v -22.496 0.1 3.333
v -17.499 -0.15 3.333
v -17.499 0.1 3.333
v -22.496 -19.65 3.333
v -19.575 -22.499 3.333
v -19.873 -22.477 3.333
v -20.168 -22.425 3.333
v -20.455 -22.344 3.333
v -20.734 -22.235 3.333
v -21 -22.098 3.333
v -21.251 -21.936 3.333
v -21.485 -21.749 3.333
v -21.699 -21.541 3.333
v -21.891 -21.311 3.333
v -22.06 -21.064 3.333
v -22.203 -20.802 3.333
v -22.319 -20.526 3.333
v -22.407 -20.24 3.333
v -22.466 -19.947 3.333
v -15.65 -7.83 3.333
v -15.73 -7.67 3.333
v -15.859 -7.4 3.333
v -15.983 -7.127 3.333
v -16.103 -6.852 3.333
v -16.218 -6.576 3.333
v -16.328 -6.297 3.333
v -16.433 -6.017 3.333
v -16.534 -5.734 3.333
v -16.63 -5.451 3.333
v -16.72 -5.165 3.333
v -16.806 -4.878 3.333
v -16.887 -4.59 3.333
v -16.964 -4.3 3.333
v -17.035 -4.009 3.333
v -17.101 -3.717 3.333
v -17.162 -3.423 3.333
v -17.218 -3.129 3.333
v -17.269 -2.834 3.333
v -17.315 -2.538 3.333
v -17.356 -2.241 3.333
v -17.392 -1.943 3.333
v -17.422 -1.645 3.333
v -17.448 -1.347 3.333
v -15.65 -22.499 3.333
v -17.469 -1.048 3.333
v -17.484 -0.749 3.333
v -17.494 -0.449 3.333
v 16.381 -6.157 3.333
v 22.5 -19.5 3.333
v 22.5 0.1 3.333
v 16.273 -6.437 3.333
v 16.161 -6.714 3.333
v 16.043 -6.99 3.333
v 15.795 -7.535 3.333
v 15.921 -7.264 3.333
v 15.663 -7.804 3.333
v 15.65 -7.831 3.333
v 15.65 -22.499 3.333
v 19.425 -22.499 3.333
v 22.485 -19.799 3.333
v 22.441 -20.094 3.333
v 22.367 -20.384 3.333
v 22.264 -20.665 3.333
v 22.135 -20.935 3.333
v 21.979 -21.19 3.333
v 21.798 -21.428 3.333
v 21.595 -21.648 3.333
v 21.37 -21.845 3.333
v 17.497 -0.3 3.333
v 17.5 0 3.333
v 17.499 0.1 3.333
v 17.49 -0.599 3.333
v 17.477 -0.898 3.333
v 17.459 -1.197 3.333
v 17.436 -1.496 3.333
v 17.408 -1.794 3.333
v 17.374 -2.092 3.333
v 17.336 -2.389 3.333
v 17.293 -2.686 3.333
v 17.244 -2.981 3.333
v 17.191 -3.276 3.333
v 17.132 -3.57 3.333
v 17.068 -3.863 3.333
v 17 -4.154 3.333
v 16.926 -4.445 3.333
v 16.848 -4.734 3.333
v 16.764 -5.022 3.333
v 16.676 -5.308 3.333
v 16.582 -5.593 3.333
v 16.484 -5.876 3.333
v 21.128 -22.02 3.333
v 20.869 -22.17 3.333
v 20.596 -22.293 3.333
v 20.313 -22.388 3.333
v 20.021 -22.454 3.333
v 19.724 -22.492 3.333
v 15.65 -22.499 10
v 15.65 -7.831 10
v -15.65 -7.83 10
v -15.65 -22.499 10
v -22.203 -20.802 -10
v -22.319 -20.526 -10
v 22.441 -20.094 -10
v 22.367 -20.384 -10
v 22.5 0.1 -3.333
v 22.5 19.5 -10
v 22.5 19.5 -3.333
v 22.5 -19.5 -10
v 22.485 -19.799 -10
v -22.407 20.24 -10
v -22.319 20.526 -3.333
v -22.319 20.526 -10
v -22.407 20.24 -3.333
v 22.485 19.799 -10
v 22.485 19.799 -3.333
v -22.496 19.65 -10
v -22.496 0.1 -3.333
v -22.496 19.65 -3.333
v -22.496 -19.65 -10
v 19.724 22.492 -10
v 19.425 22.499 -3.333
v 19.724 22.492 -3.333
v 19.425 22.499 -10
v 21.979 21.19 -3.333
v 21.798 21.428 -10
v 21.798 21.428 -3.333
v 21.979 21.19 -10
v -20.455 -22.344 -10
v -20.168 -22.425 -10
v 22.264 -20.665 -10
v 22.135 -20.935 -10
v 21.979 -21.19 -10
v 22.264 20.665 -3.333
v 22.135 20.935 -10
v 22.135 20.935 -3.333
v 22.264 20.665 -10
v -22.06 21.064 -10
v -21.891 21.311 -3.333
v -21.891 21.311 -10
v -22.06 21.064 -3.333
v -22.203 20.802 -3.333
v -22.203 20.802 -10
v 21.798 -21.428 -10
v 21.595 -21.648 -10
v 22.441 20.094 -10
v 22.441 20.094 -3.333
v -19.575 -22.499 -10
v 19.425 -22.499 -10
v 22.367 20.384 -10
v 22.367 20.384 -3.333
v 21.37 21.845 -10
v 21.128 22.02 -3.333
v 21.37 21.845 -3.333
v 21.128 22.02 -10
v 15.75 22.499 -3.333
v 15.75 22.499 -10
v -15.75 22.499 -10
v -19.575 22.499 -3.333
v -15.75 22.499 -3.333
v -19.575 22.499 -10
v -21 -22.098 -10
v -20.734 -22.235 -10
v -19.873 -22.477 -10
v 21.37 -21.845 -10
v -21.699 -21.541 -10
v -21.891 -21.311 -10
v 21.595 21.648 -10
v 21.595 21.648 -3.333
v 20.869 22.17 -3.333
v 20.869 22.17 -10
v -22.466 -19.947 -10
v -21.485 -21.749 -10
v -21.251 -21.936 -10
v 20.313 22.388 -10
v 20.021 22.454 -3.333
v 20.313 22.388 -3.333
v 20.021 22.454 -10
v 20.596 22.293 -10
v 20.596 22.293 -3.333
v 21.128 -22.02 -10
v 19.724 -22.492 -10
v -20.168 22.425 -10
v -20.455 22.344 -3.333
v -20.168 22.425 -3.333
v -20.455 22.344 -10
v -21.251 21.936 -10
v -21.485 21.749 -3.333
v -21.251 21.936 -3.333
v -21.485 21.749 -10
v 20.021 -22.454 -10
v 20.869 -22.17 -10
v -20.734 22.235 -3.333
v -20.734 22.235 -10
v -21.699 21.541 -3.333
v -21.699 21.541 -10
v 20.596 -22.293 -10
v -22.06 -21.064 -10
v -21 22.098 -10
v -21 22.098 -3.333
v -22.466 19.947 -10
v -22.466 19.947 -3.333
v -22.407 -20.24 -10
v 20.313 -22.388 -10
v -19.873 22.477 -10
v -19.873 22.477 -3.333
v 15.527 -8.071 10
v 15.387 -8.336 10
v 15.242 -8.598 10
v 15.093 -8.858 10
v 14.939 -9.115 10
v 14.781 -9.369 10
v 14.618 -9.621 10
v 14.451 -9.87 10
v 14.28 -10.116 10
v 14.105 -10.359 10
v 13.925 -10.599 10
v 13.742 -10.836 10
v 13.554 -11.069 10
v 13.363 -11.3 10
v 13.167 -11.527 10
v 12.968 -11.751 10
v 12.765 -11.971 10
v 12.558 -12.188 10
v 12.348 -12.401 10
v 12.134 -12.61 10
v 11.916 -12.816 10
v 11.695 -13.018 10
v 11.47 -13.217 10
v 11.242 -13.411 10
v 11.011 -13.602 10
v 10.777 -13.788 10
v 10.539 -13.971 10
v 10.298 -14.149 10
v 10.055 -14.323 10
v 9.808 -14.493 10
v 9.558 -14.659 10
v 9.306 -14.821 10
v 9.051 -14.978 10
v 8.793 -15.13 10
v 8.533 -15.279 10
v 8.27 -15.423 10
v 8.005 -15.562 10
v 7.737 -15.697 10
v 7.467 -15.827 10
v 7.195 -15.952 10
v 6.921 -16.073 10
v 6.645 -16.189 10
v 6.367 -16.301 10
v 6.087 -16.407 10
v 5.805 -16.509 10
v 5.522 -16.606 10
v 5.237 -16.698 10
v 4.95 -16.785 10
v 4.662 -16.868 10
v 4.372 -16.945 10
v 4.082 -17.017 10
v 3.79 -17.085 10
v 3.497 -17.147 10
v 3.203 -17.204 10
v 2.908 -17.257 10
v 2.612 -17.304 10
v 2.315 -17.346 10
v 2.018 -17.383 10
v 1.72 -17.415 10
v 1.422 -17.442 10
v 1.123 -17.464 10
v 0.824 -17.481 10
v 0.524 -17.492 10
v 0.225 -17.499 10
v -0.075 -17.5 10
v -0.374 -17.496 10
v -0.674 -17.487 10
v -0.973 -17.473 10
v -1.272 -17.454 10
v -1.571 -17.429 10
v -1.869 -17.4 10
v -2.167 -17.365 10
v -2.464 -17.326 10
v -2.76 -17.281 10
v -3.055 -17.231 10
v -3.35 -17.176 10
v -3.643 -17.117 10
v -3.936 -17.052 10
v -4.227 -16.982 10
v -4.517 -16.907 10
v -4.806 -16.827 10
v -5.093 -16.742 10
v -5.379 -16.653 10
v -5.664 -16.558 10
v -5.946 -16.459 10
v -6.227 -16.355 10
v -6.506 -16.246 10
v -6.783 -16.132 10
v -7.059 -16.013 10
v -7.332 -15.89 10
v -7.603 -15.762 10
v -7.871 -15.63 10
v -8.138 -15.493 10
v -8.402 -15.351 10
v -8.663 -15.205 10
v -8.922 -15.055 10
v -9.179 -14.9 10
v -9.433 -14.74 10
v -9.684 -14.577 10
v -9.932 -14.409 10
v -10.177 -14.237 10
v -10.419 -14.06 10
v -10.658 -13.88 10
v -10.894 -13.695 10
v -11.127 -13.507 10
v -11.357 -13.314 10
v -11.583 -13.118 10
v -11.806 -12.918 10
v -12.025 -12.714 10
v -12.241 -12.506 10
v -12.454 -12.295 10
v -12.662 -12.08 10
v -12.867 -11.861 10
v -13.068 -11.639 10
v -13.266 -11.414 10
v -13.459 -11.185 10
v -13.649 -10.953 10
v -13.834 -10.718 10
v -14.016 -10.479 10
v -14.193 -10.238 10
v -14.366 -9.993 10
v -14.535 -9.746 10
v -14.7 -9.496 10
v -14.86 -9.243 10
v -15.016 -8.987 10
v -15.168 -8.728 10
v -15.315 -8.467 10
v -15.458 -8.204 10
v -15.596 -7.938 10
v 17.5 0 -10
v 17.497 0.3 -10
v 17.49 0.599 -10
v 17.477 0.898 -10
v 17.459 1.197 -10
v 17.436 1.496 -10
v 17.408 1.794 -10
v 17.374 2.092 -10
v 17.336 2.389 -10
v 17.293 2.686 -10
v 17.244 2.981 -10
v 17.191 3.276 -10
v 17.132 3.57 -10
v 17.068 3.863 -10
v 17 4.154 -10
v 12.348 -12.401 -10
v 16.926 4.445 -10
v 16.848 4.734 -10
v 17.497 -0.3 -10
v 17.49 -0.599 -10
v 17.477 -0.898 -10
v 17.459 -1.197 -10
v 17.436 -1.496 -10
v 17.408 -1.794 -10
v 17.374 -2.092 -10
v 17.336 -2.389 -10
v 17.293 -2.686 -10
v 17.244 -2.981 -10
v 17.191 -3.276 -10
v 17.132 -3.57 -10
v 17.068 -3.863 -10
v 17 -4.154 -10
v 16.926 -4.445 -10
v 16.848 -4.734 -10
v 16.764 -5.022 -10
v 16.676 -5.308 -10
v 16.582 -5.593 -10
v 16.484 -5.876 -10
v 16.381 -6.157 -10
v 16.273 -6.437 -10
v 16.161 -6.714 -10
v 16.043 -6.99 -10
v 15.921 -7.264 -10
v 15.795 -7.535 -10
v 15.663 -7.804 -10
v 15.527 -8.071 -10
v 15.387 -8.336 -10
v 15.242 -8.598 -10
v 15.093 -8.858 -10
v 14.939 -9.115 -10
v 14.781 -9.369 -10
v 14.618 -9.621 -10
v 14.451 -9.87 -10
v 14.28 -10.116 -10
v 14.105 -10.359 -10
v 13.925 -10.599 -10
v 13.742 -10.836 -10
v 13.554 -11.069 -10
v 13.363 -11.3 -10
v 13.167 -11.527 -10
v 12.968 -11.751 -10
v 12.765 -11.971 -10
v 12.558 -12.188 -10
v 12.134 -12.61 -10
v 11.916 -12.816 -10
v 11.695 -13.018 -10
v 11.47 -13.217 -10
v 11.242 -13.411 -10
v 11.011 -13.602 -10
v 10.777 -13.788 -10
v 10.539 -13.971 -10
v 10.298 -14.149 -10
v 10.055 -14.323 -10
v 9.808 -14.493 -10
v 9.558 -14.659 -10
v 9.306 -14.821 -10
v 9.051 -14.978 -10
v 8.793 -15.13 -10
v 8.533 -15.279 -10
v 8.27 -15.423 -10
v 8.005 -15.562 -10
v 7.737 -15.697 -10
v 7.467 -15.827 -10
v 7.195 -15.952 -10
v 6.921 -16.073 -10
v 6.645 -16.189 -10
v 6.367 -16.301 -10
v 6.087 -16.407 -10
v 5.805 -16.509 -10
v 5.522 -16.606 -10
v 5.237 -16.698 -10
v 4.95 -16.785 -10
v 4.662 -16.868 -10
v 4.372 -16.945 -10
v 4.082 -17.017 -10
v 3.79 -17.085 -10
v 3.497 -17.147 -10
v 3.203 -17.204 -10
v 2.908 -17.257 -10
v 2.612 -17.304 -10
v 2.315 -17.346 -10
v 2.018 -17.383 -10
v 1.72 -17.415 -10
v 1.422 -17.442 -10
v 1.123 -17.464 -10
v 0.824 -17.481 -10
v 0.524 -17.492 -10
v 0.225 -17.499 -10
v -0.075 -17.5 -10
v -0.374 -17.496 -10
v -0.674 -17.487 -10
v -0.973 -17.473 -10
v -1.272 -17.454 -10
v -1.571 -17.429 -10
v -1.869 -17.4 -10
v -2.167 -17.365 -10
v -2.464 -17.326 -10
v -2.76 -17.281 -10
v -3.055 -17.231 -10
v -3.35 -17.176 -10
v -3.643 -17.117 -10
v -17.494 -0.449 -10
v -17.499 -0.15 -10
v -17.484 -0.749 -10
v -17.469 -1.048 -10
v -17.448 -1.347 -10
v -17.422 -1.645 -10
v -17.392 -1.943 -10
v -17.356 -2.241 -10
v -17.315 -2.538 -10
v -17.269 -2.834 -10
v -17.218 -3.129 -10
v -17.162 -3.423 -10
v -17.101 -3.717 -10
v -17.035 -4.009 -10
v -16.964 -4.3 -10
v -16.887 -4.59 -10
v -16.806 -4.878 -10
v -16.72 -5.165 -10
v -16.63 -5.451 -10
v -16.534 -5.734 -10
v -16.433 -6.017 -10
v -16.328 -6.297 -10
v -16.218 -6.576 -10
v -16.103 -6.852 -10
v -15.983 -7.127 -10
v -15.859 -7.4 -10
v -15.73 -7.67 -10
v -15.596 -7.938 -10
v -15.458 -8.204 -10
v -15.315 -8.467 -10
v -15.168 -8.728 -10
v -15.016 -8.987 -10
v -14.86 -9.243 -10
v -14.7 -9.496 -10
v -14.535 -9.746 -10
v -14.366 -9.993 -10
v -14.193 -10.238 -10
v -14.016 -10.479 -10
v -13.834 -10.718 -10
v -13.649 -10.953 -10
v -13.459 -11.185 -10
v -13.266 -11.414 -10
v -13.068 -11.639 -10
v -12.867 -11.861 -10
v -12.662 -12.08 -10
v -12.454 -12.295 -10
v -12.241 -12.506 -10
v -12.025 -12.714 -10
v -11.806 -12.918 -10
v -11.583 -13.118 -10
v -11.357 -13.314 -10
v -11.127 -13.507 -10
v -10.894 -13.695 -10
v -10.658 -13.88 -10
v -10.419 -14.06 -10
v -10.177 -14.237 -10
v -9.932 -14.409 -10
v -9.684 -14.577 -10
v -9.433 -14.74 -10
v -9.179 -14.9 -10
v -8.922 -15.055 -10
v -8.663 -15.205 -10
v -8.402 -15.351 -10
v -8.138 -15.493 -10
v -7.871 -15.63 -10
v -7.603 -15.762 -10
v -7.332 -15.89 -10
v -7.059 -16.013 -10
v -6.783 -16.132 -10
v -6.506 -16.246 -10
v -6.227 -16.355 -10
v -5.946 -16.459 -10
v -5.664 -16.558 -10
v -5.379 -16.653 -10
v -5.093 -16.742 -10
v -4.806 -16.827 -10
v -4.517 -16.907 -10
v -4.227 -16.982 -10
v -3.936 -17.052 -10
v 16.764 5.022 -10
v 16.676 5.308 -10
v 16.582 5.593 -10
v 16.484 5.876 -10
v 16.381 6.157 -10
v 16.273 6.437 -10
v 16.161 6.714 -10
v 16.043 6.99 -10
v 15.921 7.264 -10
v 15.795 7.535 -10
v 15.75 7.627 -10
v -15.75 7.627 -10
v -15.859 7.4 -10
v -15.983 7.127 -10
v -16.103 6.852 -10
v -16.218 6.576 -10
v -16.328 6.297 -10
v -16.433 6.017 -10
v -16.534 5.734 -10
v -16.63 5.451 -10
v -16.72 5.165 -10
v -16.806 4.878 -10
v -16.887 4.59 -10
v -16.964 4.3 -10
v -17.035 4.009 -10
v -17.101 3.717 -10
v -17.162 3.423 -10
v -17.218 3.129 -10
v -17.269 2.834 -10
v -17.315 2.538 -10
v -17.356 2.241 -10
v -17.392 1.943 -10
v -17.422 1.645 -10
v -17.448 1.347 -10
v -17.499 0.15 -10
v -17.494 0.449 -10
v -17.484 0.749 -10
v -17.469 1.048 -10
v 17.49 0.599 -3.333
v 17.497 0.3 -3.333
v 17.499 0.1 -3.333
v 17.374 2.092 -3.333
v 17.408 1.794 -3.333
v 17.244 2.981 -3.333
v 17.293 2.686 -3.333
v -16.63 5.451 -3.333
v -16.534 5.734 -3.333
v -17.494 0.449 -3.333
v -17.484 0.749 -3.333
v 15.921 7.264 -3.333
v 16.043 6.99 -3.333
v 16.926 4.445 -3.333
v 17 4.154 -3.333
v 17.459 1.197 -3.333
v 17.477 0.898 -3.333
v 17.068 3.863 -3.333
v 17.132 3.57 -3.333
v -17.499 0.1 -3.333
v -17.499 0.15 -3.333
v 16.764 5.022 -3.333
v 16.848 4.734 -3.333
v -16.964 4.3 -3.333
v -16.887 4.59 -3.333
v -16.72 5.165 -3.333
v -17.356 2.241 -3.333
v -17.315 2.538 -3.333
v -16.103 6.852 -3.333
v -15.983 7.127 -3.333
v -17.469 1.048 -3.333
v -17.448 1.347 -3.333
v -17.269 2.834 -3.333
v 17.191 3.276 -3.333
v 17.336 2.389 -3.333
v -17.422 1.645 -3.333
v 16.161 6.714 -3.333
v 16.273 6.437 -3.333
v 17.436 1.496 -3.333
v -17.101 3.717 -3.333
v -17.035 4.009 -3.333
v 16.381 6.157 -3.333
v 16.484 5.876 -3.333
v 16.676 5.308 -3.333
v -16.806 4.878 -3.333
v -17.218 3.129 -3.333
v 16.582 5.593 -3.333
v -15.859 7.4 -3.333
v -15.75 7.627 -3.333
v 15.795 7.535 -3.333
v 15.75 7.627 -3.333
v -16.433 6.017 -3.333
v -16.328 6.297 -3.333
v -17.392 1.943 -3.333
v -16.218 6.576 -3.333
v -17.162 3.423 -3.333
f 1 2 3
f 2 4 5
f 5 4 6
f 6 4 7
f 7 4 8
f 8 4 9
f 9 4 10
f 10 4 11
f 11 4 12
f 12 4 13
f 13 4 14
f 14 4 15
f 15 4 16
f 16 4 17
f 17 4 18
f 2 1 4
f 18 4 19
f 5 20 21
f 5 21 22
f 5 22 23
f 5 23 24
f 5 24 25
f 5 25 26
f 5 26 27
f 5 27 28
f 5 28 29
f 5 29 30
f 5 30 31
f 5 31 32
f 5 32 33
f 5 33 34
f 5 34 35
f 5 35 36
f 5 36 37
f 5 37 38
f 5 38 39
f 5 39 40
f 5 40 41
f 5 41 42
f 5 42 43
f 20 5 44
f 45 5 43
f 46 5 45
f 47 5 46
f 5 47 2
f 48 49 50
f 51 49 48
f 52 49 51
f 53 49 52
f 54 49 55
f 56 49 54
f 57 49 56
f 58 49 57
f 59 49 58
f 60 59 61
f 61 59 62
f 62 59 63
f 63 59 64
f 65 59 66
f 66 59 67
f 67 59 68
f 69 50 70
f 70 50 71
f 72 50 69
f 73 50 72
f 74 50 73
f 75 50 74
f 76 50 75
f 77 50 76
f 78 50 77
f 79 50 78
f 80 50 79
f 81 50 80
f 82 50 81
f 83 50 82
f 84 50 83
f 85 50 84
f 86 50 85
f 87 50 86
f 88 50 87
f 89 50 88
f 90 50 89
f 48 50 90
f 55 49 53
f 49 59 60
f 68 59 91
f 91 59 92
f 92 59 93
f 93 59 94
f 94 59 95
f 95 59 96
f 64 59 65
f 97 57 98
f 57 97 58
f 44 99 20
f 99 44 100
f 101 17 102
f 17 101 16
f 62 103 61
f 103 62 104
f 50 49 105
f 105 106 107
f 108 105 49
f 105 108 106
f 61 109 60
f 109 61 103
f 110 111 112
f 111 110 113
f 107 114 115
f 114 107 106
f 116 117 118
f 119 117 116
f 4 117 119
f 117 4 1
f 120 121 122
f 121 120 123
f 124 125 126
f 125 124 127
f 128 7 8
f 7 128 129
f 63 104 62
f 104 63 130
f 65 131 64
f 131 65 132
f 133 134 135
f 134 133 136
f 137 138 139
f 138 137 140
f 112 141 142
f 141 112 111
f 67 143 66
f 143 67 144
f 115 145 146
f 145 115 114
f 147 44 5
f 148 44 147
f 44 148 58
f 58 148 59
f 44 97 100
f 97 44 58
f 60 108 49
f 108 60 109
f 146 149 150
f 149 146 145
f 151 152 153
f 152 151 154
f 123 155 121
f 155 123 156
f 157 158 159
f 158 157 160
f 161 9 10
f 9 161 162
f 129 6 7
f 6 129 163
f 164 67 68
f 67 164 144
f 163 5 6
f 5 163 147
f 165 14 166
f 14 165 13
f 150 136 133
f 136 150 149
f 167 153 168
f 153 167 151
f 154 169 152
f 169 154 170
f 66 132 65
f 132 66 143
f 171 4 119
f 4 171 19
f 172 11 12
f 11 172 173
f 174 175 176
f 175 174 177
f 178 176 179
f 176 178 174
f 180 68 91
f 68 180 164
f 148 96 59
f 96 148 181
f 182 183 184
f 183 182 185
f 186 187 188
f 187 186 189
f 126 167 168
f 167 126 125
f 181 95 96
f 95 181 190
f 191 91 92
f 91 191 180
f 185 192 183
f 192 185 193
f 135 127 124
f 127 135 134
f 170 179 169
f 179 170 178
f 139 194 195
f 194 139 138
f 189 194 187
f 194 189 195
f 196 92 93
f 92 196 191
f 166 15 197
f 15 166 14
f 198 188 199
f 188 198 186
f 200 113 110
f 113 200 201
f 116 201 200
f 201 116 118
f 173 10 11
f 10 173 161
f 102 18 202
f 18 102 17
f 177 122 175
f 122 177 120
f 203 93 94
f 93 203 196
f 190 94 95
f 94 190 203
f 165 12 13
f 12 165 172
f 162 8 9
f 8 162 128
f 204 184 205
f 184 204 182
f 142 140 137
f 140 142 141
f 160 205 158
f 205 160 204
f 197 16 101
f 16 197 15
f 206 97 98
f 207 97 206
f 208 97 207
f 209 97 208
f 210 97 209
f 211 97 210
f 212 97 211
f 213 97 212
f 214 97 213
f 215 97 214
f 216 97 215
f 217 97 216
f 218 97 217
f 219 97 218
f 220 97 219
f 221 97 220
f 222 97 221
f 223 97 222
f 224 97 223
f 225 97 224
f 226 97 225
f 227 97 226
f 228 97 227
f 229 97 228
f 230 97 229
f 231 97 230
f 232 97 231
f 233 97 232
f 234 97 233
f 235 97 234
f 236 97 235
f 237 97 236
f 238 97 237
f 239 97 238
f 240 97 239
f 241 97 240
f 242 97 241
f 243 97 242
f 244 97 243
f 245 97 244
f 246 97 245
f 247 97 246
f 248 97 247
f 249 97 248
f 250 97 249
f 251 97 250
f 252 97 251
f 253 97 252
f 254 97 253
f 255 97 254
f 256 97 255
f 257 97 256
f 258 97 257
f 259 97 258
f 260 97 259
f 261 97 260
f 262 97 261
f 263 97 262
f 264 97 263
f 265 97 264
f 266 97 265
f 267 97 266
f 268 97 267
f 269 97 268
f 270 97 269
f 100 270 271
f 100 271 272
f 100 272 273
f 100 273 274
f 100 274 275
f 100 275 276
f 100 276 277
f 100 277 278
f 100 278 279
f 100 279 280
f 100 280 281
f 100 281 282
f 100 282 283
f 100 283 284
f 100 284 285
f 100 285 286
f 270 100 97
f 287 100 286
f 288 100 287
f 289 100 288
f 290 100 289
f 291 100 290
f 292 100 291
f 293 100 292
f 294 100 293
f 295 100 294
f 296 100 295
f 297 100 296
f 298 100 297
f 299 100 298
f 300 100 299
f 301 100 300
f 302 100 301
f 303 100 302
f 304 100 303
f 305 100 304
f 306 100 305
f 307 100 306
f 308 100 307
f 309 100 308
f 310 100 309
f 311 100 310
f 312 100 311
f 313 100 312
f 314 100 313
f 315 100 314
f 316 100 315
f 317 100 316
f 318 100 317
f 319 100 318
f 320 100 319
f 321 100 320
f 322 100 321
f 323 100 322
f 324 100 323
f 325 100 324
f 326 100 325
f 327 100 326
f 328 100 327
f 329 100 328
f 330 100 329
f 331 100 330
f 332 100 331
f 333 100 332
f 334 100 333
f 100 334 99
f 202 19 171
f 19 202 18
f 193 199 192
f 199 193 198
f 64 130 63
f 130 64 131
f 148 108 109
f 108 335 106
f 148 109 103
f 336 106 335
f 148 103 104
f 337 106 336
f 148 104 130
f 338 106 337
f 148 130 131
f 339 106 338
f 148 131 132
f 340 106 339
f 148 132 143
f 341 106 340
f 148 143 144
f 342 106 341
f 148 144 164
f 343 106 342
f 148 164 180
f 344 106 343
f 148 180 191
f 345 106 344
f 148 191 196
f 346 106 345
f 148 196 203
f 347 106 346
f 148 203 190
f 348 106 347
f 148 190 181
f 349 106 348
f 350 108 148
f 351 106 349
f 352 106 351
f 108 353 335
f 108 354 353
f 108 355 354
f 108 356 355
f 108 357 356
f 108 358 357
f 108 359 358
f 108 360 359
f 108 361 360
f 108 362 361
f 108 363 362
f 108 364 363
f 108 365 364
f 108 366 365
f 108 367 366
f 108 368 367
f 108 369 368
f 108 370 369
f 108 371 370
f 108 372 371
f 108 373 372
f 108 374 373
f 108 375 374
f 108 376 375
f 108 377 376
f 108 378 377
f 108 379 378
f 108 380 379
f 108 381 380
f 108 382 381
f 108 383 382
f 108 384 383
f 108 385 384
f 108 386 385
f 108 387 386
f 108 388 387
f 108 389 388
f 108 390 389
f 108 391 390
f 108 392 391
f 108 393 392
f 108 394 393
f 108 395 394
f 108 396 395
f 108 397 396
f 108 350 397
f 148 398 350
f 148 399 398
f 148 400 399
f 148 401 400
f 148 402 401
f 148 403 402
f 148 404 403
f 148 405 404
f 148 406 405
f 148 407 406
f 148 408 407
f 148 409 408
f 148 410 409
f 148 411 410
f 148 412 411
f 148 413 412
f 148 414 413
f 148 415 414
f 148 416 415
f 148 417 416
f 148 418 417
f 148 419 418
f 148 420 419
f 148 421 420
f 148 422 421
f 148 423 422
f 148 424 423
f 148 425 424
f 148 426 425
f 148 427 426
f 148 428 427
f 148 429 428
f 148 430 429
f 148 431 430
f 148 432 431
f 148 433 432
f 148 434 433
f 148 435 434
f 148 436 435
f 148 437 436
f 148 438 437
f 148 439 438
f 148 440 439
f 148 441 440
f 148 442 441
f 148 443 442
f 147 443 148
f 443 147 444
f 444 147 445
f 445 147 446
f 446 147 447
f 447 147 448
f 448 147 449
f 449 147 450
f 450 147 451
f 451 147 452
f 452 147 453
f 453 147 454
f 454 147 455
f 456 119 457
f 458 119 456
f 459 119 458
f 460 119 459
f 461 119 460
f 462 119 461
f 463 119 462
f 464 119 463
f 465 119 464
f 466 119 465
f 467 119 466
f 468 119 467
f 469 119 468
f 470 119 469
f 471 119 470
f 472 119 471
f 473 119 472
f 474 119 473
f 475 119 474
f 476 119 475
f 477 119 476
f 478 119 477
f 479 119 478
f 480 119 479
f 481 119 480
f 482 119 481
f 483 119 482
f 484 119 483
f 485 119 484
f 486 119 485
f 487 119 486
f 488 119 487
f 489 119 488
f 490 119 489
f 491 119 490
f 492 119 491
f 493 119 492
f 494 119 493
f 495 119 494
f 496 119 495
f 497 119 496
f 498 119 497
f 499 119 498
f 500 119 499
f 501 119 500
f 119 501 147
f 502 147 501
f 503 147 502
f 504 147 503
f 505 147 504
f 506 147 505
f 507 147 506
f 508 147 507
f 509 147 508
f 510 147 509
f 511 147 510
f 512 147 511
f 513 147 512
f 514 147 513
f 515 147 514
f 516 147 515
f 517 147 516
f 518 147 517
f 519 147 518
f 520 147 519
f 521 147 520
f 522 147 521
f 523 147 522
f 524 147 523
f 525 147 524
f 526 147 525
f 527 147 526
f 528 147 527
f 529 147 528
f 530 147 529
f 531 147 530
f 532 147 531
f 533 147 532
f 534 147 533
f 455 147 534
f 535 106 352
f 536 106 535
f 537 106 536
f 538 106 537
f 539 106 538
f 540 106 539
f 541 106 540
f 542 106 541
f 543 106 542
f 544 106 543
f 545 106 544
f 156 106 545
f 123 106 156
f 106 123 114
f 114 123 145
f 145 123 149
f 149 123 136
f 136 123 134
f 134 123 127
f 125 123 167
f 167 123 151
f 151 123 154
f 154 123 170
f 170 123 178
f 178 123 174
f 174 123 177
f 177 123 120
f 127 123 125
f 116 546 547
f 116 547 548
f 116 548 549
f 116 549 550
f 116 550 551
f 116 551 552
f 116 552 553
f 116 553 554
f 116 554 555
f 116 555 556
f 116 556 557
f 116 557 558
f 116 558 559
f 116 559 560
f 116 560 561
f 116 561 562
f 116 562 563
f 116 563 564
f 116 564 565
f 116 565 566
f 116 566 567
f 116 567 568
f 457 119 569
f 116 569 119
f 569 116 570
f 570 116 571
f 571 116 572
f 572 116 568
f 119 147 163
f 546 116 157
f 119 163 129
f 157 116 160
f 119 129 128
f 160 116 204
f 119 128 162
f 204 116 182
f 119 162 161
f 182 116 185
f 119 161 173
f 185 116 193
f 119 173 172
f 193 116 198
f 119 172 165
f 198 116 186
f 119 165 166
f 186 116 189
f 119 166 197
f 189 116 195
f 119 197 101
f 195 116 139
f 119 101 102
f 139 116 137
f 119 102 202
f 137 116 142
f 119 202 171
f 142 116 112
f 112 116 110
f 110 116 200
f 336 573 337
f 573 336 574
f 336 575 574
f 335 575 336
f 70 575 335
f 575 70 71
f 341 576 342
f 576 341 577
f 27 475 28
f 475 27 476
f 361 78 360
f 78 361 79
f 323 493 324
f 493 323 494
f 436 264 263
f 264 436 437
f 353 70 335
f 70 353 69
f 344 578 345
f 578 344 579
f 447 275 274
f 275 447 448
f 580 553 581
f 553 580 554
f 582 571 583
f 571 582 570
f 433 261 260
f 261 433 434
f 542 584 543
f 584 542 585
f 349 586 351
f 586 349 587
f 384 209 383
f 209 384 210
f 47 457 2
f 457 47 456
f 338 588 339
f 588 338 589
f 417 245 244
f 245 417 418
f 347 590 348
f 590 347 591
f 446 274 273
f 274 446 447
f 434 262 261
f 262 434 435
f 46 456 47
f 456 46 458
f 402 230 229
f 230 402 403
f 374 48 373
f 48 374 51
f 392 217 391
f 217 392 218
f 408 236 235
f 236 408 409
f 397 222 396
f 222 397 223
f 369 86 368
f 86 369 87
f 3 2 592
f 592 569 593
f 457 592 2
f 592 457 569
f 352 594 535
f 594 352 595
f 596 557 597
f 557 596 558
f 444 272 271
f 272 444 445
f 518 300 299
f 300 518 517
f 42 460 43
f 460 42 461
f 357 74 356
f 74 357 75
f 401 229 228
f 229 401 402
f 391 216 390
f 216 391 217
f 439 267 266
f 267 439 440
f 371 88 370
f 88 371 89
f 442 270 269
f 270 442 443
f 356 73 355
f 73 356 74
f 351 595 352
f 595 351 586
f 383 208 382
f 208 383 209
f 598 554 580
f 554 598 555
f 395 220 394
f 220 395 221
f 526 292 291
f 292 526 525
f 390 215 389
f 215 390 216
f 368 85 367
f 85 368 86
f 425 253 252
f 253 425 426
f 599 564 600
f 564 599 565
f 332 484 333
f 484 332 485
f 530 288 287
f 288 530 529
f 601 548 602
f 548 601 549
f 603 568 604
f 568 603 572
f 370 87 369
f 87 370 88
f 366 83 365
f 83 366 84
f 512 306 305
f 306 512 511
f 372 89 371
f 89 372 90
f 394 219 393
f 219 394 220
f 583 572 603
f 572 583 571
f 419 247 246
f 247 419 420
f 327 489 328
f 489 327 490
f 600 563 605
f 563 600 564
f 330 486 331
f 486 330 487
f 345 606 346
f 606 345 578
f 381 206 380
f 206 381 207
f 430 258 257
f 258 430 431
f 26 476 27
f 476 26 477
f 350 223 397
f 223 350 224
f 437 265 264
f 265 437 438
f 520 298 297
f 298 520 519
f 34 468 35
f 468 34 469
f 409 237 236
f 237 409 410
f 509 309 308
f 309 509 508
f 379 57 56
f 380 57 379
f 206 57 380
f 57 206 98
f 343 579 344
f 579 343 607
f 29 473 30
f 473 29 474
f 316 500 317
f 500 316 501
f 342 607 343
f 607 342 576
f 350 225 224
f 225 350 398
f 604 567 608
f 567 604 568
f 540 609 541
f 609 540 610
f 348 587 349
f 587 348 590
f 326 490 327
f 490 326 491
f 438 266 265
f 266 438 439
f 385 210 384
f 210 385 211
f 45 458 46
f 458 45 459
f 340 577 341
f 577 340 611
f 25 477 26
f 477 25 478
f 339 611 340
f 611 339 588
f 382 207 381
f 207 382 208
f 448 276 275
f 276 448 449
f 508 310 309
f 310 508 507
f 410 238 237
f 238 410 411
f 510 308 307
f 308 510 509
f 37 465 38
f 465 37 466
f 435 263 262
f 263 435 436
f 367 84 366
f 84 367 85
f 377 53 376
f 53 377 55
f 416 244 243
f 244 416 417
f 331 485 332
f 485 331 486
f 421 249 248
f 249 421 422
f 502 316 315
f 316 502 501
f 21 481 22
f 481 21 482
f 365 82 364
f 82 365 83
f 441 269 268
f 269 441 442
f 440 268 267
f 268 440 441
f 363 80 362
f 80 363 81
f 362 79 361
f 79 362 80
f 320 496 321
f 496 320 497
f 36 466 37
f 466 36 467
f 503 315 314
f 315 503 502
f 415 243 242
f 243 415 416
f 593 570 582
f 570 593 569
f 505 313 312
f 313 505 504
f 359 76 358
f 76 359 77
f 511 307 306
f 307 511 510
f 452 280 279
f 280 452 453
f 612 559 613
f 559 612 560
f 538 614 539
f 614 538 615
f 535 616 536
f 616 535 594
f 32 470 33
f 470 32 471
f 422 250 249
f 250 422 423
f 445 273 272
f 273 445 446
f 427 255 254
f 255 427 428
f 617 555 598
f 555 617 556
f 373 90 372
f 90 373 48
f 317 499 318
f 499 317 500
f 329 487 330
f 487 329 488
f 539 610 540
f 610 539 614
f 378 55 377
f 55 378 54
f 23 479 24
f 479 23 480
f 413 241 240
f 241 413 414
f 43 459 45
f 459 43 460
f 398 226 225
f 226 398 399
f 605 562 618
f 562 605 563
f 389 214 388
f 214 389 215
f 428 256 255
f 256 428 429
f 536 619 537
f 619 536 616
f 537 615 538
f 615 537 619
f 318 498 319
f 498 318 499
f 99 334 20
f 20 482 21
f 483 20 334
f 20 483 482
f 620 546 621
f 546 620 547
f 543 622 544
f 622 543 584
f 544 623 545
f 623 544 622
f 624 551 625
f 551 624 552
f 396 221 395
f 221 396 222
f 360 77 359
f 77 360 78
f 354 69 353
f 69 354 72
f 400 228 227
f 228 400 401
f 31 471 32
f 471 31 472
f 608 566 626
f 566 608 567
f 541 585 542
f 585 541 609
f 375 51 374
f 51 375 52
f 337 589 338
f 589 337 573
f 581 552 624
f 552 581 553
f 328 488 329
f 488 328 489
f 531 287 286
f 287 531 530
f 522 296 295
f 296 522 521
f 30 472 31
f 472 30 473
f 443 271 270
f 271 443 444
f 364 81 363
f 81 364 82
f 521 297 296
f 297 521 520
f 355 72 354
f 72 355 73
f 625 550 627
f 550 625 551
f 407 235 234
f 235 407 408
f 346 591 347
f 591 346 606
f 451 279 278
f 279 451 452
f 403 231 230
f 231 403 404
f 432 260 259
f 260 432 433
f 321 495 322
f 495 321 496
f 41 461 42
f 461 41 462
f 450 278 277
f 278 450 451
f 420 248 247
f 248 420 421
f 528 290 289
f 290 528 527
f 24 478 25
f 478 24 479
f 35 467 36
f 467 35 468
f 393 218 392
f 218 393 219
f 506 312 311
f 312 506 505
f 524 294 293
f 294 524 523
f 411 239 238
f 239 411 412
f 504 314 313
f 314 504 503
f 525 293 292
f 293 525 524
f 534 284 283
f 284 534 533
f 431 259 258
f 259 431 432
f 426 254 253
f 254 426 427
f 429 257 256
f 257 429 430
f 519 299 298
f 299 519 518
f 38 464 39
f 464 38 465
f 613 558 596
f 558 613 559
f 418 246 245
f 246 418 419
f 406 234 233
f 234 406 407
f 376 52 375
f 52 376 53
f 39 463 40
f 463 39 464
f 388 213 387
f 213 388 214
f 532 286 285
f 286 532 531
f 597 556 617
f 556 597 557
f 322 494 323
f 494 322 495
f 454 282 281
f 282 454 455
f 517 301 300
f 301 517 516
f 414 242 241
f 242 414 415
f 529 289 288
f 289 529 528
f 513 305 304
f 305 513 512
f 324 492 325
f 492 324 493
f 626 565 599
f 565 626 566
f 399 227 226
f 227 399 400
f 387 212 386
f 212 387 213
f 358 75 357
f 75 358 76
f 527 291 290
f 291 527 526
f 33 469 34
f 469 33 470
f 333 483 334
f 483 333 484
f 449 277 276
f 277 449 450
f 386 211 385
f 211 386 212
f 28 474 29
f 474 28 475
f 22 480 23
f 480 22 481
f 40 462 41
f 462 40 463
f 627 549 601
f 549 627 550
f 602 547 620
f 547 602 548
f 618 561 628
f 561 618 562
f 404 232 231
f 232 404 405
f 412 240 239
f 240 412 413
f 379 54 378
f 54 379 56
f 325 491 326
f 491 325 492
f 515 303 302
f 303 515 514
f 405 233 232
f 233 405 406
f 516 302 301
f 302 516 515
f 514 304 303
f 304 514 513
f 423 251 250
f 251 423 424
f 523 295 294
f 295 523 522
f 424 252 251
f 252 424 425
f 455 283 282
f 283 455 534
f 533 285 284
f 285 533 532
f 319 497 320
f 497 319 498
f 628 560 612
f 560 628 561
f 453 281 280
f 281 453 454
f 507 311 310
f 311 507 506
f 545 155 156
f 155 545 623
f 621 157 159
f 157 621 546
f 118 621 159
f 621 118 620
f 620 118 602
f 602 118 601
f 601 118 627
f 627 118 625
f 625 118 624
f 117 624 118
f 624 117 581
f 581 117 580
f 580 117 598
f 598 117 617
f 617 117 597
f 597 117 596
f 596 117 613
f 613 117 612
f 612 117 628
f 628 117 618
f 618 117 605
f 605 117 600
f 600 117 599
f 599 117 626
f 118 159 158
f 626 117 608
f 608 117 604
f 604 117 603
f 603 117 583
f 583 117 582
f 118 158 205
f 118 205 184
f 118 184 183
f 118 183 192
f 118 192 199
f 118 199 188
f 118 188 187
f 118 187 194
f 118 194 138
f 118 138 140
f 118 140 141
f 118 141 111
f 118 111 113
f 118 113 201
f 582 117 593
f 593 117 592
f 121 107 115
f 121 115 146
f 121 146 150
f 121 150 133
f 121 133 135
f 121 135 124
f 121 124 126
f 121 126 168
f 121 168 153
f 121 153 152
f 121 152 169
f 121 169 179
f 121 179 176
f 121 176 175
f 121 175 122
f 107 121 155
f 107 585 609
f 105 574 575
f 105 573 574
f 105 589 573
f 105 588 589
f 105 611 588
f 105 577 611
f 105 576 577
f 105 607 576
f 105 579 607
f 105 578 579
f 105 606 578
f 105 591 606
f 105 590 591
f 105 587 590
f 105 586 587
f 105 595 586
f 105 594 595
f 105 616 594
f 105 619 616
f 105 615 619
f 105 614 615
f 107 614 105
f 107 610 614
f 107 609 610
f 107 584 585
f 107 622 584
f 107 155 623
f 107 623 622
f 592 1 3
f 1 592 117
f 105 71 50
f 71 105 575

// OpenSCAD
$fa = .01;
$fs = $preview ? 1 : .3;

id=35;
od=45;
h=20;
cutout=.9;
chamfer=3;
slop=.1;

difference(){
    minkowski(){
        cube([od-2*chamfer,od-2*chamfer,h-2*chamfer], center=true);
        cylinder(h=2*chamfer,r=chamfer,center=true);
    }
    cylinder(h=h+.2, d=id, center=true);
    #translate([0,od/4+.1,0])
        cube([id*cutout,od/2,h+.2], center=true);
    translate([0,od/4+.1,.1])
        cube([od+.2,od/2,h/3+.2], center=true);
    difference(){
        translate([0,0,h*2/3]) minkowski(){
            cube([od-2*chamfer,od-2*chamfer,h-2*chamfer], center=true);
            cylinder(h=2*chamfer,r=chamfer+.1,center=true);
        }
        translate([0,-od/4-.1,h/3])
            cube([id*cutout-2*slop,od/2,h+.2], center=true);
    }
}
